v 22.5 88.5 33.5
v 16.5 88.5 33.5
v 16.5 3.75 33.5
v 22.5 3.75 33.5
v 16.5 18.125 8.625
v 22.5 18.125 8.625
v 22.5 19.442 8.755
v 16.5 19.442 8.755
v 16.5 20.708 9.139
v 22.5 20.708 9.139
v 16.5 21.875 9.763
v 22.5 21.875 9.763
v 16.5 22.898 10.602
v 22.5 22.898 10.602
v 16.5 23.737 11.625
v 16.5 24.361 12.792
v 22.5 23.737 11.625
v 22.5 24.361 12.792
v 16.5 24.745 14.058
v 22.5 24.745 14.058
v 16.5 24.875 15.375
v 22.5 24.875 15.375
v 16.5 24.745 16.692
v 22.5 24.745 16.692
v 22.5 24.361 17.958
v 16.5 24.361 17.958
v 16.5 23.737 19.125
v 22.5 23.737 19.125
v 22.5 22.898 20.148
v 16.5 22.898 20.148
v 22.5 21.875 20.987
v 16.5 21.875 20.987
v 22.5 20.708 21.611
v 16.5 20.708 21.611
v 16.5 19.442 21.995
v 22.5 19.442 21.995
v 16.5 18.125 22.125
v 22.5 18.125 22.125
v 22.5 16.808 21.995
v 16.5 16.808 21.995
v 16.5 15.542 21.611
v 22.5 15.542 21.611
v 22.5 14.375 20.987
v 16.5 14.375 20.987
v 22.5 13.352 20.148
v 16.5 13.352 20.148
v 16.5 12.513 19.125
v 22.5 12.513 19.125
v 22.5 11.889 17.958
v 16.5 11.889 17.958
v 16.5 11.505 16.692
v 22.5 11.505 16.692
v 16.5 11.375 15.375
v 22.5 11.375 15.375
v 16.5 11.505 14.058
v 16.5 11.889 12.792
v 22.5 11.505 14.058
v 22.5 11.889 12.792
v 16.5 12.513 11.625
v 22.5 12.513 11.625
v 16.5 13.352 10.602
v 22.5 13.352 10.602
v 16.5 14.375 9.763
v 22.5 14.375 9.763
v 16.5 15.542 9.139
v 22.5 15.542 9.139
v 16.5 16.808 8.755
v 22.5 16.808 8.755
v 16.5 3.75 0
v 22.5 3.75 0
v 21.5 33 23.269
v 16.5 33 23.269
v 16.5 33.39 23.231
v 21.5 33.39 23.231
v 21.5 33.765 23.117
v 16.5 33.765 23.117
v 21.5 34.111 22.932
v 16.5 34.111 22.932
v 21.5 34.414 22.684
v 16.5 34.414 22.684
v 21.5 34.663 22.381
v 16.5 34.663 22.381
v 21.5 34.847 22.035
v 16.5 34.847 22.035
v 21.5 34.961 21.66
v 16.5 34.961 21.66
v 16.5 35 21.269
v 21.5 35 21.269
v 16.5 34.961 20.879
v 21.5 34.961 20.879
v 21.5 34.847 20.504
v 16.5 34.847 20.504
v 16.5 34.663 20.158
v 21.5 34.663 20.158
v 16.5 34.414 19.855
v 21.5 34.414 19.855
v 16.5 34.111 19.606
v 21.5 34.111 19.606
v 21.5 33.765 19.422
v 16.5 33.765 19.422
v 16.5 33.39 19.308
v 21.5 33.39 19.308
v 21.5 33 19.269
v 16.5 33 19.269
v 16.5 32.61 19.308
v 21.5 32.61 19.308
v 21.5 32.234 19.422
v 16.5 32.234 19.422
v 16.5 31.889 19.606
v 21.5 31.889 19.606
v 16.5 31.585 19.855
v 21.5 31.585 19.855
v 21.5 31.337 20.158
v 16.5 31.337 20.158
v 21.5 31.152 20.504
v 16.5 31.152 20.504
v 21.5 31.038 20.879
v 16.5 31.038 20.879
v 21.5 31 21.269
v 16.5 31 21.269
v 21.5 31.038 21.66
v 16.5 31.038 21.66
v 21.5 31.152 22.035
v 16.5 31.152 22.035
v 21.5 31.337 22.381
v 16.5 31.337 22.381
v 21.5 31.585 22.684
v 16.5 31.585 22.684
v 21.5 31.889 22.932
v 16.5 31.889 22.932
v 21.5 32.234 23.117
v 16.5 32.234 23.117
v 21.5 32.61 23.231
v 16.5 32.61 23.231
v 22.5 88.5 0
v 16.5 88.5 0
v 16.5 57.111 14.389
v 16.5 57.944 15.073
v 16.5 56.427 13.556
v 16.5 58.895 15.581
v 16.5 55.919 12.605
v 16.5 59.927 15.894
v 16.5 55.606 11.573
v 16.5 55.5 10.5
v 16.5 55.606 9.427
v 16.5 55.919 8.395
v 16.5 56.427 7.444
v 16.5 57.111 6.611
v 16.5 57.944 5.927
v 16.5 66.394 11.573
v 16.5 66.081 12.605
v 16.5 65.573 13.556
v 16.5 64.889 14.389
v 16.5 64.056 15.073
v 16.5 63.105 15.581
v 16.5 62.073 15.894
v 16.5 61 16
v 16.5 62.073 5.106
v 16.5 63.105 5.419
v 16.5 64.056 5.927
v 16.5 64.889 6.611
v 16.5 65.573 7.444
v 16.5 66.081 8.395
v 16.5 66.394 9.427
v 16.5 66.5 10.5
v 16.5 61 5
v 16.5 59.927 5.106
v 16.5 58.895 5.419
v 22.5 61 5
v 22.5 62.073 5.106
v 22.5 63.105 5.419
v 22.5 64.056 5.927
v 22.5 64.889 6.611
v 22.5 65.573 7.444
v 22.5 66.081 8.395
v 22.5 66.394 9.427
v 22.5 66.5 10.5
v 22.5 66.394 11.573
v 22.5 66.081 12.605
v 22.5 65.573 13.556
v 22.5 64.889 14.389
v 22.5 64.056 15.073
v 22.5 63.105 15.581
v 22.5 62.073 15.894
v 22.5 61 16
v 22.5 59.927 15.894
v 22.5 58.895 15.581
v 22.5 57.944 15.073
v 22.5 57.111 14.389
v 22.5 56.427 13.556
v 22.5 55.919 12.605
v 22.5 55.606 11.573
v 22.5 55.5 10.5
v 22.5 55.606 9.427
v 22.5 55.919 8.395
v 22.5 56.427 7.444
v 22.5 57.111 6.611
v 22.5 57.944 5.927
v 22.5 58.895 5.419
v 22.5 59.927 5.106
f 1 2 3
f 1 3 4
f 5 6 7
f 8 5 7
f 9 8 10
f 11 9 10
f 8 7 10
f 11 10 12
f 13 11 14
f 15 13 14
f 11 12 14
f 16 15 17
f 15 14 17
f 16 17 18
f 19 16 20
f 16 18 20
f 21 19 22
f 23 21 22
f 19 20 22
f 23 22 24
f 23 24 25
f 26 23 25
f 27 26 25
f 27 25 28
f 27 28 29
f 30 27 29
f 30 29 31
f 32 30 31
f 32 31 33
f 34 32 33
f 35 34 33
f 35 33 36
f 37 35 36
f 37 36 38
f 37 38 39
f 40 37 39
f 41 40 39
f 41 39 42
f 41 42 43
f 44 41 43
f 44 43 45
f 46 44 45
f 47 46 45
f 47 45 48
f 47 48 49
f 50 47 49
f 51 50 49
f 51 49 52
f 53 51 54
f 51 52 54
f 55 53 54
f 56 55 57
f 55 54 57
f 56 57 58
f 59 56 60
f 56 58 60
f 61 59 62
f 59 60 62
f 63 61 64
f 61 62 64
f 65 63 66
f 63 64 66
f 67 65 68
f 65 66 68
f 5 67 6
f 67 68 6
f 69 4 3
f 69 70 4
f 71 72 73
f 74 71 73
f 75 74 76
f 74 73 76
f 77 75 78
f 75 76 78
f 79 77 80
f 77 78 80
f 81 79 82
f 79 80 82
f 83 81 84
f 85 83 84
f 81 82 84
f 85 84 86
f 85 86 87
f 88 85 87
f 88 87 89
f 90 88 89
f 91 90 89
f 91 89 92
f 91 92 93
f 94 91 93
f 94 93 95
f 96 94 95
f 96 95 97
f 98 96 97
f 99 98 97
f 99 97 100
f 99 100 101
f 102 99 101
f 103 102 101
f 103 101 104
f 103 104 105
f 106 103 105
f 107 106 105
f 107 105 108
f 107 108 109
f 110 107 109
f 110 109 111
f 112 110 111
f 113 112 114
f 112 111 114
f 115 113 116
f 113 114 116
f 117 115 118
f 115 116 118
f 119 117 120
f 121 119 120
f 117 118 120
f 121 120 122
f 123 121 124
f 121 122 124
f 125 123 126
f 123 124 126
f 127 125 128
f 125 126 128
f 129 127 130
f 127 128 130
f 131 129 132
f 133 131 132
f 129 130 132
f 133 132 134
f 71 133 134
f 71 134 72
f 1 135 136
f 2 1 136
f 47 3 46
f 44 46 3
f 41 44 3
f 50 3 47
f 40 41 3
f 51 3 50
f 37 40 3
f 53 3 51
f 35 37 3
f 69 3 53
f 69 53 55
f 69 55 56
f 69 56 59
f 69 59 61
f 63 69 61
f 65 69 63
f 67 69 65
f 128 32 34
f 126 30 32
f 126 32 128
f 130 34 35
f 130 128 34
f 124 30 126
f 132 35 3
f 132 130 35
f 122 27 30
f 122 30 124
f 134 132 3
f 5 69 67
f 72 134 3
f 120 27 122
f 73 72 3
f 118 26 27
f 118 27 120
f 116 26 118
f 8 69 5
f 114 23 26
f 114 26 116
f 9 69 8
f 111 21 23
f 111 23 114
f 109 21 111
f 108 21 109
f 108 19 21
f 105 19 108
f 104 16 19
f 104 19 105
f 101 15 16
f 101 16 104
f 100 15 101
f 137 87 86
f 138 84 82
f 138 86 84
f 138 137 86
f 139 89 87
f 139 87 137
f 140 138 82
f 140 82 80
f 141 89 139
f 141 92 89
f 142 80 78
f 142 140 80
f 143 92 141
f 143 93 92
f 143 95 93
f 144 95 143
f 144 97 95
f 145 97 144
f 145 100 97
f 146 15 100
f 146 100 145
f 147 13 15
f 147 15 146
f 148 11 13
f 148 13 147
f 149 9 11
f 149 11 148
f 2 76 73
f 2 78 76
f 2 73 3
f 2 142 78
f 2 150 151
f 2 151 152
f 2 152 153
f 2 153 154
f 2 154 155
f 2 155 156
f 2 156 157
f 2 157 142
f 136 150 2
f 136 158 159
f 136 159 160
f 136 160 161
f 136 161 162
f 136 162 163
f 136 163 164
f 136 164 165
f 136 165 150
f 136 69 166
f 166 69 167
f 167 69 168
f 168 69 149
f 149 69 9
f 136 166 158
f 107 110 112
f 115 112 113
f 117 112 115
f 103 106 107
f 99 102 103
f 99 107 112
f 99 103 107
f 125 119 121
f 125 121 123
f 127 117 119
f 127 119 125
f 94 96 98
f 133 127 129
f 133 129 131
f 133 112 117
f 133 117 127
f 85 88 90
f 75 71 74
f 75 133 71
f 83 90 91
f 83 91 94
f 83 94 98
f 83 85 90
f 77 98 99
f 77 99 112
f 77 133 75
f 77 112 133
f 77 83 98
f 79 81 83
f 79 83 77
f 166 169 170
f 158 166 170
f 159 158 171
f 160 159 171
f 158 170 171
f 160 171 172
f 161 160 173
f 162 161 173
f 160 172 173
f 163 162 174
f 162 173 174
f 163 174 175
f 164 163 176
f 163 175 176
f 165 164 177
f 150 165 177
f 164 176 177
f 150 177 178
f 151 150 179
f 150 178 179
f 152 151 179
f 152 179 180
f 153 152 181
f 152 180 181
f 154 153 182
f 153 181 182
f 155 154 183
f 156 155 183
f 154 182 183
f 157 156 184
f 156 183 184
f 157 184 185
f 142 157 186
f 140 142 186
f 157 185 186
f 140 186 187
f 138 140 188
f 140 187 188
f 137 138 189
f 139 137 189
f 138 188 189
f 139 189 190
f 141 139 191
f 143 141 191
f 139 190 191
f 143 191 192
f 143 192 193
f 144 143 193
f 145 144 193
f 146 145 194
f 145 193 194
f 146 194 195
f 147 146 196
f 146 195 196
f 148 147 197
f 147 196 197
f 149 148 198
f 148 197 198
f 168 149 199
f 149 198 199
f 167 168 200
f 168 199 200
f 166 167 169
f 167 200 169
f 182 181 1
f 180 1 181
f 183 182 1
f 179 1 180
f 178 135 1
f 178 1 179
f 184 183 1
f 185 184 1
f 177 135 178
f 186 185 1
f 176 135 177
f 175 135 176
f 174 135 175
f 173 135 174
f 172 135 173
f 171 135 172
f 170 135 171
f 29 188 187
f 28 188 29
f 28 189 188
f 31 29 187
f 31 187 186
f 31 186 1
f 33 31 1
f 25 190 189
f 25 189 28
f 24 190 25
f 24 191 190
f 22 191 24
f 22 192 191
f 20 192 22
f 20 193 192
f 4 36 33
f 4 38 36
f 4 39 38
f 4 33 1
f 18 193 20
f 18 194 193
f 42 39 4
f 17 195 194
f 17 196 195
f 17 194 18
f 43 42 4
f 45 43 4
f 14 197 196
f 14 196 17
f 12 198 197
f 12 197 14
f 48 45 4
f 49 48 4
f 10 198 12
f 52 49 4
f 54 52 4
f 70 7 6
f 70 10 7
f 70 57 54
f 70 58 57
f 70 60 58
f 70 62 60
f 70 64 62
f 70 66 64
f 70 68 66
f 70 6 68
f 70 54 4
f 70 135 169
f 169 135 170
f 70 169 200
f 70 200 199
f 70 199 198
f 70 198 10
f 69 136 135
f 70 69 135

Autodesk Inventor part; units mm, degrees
ref_plane "YZ Plane" through (0, 0, 0) normal (1, 0, 0) x (0, 1, 0)
ref_plane "XZ Plane" through (0, 0, 0) normal (0, 1, 0) x (-1, 0, 0)
ref_plane "Work Plane1" through (0, 0, 0) normal (0, 0, 1) x (1, 0, 0)
sketch "Sketch1" plane through (0, 0, 0) normal (0, 0, 1) x (1, 0, 0)
  line L0 (23.5, 88.5) -> (-23.5, 88.5) projected
  line L1 (-23.5, 88.5) -> (-23.5, 36.5) projected
  line L2 (-26.5, 33.5) -> (-89, 33.5) projected
  line L3 (-89, 33.5) -> (-89, -72.5) projected
  line L4 (-89, -72.5) -> (-77, -72.5) projected
  line L5 (-74, -75.5) -> (-74, -93.5) projected
  line L6 (-74, -93.5) -> (74, -93.5) projected
  line L7 (74, -93.5) -> (74, -75.5) projected
  line L8 (77, -72.5) -> (89, -72.5) projected
  line L9 (89, -72.5) -> (89, 33.5) projected
  line L10 (89, 33.5) -> (26.5, 33.5) projected
  line L11 (23.5, 36.5) -> (23.5, 88.5) projected
  line L12 (-4.5, 81.5) -> (-4.5, 36.5) projected
  line L13 (-7.5, 33.5) -> (-13.5, 33.5) projected
  line L14 (-16.5, 36.5) -> (-16.5, 81.5) projected
  line L15 (-13.5, 84.5) -> (-7.5, 84.5) projected
  line L16 (16.5, 81.5) -> (16.5, 36.5) projected
  line L17 (13.5, 33.5) -> (7.5, 33.5) projected
  line L18 (4.5, 36.5) -> (4.5, 81.5) projected
  line L19 (7.5, 84.5) -> (13.5, 84.5) projected
  line L20 (16.5, 88.5) -> (22.5, 88.5)
  line L21 (22.5, 88.5) -> (22.5, 3.75)
  line L22 (22.5, 3.75) -> (16.5, 3.75)
  line L23 (16.5, 3.75) -> (16.5, 88.5)
  line L24 (59.9, 4.75) -> (32.2, 4.75)
  arc A0 (13.5, 33.5) -> (16.5, 36.5) centre (13.5, 36.5) ccw projected
  arc A1 (4.5, 36.5) -> (7.5, 33.5) centre (7.5, 36.5) ccw projected
  arc A2 (7.5, 84.5) -> (4.5, 81.5) centre (7.5, 81.5) ccw projected
  arc A3 (16.5, 81.5) -> (13.5, 84.5) centre (13.5, 81.5) ccw projected
  arc A4 (-4.5, 81.5) -> (-7.5, 84.5) centre (-7.5, 81.5) ccw projected
  arc A5 (-7.5, 33.5) -> (-4.5, 36.5) centre (-7.5, 36.5) ccw projected
  arc A6 (-16.5, 36.5) -> (-13.5, 33.5) centre (-13.5, 36.5) ccw projected
  arc A7 (-13.5, 84.5) -> (-16.5, 81.5) centre (-13.5, 81.5) ccw projected
  arc A8 (-26.5, 33.5) -> (-23.5, 36.5) centre (-26.5, 36.5) ccw projected
  arc A9 (-74, -75.5) -> (-77, -72.5) centre (-77, -75.5) ccw projected
  arc A10 (77, -72.5) -> (74, -75.5) centre (77, -75.5) ccw projected
  arc A11 (23.5, 36.5) -> (26.5, 33.5) centre (26.5, 36.5) ccw projected
  point P0 (0, 0)
  dimension "d0" = 1
  dimension "d1" = 1
ref_plane "Work Plane2" through (-89, -40.3889, 33.5) normal (0, 0, 1) x (1, 0, 0)
extrude "Extrusion1" add sketch "Sketch1" along normal up to surface (33.5 mm away) contours L21 L22 L23 L16 L0
sketch "Sketch2" plane through (22.5, 3.75, 0) normal (1, 0, 0) x (0, 0, -1)
  circle A0 centre (-15.375, 14.375) radius 6.75 projected
  circle A1 centre (-10.5, 57.25) radius 5.5 projected
  point P0 (0, -3.75)
  dimension "d8" = 11
extrude "Extrusion2" cut sketch "Sketch2" against normal up to next
sketch "Sketch3" plane through (16.5, 3.75, 0) normal (-1, 0, 0) x (0, 0, 1)
  circle A0 centre (21.2694, 29.2497) radius 2 projected
  point P0 (0, -3.75)
extrude "Extrusion3" cut sketch "Sketch3" against normal blind 5
properties part number "left_gear_holder"
